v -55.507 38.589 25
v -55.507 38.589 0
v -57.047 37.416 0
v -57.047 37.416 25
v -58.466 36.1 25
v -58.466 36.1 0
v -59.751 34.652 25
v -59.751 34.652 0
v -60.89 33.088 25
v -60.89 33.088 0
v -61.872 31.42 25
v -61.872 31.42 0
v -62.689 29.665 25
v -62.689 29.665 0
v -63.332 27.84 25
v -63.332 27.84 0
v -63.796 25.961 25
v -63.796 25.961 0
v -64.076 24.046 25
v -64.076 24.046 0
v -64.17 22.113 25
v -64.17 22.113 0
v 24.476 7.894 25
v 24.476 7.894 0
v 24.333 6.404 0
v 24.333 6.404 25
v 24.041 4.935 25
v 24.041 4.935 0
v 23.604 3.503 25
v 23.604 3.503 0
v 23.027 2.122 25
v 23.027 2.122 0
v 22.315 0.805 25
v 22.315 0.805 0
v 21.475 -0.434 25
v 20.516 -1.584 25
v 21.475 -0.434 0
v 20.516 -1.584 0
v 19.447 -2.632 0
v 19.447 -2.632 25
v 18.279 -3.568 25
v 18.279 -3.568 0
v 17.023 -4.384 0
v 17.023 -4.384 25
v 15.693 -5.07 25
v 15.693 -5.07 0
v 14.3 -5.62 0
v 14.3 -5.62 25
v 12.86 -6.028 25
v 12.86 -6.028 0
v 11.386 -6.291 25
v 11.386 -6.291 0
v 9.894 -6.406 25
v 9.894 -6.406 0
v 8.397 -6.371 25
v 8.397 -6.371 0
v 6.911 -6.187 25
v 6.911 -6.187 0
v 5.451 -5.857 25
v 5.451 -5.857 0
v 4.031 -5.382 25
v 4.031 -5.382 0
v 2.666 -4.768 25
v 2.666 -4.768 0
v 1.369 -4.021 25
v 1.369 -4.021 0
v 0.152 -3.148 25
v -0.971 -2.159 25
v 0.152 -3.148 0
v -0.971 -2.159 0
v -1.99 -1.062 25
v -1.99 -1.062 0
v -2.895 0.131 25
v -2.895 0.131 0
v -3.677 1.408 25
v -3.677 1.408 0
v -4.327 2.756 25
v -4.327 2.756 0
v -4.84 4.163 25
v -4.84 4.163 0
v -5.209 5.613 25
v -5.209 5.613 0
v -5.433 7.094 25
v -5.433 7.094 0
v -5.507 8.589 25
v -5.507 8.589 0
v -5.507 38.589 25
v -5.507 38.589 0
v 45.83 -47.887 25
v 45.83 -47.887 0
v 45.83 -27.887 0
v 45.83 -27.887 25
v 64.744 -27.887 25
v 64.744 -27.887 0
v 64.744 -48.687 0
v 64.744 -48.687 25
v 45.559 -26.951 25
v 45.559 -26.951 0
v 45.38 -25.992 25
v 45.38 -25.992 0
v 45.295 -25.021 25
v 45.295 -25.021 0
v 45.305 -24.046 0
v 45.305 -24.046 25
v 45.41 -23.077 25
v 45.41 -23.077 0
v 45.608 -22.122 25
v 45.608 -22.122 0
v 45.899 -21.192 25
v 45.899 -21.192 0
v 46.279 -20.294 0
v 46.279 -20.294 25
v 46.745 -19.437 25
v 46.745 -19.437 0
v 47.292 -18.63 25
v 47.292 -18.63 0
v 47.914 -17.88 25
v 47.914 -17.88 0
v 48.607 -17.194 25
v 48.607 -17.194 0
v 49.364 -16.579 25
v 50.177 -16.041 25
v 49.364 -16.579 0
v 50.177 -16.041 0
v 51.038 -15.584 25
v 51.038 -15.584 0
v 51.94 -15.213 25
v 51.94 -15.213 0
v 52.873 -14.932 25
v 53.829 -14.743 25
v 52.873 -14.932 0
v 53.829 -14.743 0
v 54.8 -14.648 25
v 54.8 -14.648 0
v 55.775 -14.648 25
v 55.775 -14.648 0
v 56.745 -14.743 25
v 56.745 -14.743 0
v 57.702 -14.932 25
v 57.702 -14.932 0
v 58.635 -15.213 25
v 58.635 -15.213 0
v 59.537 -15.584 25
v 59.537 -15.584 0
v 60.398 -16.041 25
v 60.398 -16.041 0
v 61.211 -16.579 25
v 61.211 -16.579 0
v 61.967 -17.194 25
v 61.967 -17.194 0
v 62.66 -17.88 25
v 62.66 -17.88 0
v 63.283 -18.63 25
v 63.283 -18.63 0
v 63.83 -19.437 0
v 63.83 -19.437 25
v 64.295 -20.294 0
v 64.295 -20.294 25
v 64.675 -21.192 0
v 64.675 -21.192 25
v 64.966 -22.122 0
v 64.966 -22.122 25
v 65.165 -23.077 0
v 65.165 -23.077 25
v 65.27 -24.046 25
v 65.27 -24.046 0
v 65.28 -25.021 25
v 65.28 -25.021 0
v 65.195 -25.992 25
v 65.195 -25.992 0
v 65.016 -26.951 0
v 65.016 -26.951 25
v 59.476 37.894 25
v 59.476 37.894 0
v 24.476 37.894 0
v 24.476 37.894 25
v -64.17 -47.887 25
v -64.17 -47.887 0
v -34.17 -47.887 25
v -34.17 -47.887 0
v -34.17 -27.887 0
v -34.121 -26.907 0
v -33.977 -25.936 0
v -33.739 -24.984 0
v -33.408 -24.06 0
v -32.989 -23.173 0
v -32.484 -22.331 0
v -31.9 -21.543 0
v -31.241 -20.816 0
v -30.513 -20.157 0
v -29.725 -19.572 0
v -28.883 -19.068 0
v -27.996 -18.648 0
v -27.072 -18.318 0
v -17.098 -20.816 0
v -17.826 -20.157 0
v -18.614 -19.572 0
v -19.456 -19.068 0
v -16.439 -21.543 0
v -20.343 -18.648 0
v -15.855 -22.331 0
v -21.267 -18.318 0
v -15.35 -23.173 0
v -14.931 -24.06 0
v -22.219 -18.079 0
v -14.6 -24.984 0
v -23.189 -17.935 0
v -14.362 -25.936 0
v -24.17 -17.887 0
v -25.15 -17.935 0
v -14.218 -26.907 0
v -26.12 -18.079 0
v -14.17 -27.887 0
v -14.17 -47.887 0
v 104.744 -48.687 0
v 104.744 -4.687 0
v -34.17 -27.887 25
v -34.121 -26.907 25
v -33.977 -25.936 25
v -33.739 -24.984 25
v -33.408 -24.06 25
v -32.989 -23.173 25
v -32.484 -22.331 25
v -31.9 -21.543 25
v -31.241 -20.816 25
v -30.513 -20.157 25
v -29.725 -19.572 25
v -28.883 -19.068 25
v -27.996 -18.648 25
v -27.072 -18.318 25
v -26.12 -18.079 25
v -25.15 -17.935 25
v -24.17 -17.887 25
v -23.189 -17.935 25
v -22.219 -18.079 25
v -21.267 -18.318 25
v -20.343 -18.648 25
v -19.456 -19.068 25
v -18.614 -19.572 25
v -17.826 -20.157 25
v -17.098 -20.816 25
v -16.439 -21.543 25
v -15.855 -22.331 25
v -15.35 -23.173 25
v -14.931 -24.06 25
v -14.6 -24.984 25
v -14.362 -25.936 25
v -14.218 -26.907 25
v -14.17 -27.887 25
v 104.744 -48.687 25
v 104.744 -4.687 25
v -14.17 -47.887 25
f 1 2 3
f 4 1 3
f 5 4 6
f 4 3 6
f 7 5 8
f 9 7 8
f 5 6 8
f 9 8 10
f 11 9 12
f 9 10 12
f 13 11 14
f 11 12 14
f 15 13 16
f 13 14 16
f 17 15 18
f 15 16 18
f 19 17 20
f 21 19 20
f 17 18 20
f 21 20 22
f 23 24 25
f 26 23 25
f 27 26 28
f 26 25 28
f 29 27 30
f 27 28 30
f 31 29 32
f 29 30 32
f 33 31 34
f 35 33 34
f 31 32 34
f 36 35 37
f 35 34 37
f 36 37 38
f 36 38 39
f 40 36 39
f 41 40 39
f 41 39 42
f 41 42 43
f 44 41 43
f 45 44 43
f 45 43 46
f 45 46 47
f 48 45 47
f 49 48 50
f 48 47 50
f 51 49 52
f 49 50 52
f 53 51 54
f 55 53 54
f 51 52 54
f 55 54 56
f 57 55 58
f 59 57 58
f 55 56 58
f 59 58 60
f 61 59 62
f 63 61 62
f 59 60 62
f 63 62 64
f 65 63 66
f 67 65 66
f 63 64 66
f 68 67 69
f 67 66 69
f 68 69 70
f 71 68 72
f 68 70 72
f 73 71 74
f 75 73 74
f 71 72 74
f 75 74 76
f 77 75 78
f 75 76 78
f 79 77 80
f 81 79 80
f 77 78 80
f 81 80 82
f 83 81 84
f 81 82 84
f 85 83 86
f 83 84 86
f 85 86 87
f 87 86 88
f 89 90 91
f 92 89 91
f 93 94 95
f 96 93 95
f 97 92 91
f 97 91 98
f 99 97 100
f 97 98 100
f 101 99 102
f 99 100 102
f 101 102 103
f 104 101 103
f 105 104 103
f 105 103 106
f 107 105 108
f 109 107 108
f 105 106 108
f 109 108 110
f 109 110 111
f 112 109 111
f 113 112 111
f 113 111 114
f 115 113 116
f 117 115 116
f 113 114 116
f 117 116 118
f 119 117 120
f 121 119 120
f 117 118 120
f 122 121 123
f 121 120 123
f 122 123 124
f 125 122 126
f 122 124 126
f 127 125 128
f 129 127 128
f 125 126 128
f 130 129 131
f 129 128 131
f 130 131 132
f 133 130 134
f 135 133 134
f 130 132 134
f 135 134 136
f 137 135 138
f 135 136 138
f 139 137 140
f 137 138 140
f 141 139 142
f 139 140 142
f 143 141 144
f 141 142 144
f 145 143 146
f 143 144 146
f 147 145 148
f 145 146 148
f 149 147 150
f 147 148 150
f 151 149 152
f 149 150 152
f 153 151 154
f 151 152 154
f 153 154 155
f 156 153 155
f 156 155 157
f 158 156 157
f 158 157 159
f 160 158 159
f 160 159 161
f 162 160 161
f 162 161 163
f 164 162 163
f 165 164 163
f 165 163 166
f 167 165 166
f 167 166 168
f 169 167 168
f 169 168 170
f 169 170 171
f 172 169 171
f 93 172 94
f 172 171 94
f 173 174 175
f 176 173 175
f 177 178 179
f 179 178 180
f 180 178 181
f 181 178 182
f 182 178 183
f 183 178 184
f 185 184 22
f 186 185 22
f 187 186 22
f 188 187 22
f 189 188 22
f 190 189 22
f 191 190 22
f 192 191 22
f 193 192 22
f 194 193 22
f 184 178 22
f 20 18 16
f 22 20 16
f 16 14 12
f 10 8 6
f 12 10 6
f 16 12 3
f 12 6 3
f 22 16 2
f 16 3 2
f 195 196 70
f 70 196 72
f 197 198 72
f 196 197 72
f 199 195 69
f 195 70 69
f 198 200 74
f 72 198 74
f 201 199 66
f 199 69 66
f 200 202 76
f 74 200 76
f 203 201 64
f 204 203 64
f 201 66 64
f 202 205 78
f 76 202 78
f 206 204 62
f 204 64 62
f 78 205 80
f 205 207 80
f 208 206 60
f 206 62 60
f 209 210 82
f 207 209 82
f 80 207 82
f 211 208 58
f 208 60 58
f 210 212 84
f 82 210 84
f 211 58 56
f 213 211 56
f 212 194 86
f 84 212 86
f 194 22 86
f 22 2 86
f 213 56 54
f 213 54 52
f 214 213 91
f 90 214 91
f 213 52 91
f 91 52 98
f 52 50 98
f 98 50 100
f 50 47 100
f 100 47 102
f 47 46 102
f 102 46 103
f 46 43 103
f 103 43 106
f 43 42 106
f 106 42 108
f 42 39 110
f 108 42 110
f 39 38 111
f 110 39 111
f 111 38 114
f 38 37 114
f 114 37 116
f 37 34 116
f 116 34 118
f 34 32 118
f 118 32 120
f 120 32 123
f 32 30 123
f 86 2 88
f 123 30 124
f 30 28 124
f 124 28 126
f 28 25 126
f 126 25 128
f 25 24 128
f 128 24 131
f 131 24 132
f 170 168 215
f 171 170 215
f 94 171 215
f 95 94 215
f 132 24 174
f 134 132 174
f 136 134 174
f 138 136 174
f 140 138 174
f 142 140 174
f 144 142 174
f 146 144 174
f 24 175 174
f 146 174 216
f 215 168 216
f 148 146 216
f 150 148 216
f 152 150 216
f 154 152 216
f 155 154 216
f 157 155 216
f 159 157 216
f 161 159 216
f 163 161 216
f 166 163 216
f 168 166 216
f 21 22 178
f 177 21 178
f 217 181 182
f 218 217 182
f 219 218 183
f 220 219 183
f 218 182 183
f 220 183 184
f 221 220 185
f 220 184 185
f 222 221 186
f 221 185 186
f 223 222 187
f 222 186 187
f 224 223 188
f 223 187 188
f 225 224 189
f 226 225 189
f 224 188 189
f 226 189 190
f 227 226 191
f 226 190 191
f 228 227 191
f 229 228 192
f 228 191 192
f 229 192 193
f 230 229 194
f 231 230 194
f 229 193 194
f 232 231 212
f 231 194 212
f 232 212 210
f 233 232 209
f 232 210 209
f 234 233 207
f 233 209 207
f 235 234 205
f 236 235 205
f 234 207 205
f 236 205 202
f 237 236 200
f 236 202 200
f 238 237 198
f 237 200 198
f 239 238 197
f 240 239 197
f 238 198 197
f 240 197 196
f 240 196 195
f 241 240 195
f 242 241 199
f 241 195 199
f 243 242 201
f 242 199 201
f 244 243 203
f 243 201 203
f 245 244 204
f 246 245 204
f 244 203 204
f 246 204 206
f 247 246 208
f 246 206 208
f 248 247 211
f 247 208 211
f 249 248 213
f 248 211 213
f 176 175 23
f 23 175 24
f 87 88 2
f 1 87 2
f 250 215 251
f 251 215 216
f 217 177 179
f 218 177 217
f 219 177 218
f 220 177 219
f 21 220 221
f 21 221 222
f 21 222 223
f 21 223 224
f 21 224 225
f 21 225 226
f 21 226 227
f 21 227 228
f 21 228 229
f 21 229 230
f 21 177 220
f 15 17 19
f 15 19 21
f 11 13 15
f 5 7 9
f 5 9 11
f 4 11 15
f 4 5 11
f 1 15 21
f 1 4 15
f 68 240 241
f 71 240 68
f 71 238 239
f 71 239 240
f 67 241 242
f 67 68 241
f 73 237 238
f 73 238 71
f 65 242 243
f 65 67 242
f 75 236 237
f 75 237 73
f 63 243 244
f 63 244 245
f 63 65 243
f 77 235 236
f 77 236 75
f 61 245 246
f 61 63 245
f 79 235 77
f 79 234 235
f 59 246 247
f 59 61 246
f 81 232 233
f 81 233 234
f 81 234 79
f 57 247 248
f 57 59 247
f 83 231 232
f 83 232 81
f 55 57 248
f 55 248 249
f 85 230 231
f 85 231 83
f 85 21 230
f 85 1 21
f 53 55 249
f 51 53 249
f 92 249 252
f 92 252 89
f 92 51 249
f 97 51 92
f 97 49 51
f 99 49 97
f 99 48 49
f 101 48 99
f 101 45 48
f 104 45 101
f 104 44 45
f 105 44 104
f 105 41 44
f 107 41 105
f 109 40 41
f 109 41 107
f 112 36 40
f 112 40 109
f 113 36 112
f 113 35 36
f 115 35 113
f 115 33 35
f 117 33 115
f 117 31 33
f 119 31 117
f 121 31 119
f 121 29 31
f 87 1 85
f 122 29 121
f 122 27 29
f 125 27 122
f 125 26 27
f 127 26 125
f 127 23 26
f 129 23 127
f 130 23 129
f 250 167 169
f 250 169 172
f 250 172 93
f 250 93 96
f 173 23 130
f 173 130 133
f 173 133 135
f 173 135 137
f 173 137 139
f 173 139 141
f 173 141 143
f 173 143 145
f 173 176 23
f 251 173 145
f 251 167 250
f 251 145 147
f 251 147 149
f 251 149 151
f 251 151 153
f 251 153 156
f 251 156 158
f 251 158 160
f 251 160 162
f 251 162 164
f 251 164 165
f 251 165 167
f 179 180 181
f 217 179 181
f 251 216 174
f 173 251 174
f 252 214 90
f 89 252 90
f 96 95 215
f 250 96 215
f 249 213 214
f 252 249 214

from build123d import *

# Parameters (mm, degrees)
F1_DEPTH = 25


with BuildPart() as f1:
    # F0 (on Top) → F1 (new body)
    with BuildSketch(Plane.XY):
        with BuildLine():
            Line((-64.169525, 22.113068), (-64.169525, -47.886932))
            Line((-64.169525, -47.886932), (-34.169525, -47.886932))
            Line((-34.169525, -47.886932), (-34.169525, -27.886932))
            ThreePointArc((-34.169525, -27.886932), (-24.169525, -17.886932), (-14.169525, -27.886932))
            Line((-14.169525, -27.886932), (-14.169525, -47.886932))
            Line((-14.169525, -47.886932), (45.830475, -47.886932))
            Line((45.830475, -47.886932), (45.830475, -27.886932))
            ThreePointArc((45.830475, -27.886932), (55.28729, -14.635985), (64.744104, -27.886932))
            Line((64.744104, -27.886932), (64.744104, -48.687104))
            Line((64.744104, -48.687104), (104.744104, -48.687104))
            Line((104.744104, -48.687104), (104.744104, -4.687104))
            Line((104.744104, -4.687104), (59.47641, 37.893837))
            Line((59.47641, 37.893837), (24.47641, 37.893837))
            Line((24.47641, 37.893837), (24.47641, 7.893837))
            ThreePointArc((24.47641, 7.893837), (9.144929, -6.407142), (-5.50748, 8.588831))
            Line((-5.50748, 8.588831), (-5.50748, 38.588831))
            Line((-5.50748, 38.588831), (-55.50748, 38.588831))
            ThreePointArc((-55.50748, 38.588831), (-61.872055, 31.420078), (-64.169525, 22.113068))
        make_face()
    extrude(amount=F1_DEPTH)


solid = f1.part
